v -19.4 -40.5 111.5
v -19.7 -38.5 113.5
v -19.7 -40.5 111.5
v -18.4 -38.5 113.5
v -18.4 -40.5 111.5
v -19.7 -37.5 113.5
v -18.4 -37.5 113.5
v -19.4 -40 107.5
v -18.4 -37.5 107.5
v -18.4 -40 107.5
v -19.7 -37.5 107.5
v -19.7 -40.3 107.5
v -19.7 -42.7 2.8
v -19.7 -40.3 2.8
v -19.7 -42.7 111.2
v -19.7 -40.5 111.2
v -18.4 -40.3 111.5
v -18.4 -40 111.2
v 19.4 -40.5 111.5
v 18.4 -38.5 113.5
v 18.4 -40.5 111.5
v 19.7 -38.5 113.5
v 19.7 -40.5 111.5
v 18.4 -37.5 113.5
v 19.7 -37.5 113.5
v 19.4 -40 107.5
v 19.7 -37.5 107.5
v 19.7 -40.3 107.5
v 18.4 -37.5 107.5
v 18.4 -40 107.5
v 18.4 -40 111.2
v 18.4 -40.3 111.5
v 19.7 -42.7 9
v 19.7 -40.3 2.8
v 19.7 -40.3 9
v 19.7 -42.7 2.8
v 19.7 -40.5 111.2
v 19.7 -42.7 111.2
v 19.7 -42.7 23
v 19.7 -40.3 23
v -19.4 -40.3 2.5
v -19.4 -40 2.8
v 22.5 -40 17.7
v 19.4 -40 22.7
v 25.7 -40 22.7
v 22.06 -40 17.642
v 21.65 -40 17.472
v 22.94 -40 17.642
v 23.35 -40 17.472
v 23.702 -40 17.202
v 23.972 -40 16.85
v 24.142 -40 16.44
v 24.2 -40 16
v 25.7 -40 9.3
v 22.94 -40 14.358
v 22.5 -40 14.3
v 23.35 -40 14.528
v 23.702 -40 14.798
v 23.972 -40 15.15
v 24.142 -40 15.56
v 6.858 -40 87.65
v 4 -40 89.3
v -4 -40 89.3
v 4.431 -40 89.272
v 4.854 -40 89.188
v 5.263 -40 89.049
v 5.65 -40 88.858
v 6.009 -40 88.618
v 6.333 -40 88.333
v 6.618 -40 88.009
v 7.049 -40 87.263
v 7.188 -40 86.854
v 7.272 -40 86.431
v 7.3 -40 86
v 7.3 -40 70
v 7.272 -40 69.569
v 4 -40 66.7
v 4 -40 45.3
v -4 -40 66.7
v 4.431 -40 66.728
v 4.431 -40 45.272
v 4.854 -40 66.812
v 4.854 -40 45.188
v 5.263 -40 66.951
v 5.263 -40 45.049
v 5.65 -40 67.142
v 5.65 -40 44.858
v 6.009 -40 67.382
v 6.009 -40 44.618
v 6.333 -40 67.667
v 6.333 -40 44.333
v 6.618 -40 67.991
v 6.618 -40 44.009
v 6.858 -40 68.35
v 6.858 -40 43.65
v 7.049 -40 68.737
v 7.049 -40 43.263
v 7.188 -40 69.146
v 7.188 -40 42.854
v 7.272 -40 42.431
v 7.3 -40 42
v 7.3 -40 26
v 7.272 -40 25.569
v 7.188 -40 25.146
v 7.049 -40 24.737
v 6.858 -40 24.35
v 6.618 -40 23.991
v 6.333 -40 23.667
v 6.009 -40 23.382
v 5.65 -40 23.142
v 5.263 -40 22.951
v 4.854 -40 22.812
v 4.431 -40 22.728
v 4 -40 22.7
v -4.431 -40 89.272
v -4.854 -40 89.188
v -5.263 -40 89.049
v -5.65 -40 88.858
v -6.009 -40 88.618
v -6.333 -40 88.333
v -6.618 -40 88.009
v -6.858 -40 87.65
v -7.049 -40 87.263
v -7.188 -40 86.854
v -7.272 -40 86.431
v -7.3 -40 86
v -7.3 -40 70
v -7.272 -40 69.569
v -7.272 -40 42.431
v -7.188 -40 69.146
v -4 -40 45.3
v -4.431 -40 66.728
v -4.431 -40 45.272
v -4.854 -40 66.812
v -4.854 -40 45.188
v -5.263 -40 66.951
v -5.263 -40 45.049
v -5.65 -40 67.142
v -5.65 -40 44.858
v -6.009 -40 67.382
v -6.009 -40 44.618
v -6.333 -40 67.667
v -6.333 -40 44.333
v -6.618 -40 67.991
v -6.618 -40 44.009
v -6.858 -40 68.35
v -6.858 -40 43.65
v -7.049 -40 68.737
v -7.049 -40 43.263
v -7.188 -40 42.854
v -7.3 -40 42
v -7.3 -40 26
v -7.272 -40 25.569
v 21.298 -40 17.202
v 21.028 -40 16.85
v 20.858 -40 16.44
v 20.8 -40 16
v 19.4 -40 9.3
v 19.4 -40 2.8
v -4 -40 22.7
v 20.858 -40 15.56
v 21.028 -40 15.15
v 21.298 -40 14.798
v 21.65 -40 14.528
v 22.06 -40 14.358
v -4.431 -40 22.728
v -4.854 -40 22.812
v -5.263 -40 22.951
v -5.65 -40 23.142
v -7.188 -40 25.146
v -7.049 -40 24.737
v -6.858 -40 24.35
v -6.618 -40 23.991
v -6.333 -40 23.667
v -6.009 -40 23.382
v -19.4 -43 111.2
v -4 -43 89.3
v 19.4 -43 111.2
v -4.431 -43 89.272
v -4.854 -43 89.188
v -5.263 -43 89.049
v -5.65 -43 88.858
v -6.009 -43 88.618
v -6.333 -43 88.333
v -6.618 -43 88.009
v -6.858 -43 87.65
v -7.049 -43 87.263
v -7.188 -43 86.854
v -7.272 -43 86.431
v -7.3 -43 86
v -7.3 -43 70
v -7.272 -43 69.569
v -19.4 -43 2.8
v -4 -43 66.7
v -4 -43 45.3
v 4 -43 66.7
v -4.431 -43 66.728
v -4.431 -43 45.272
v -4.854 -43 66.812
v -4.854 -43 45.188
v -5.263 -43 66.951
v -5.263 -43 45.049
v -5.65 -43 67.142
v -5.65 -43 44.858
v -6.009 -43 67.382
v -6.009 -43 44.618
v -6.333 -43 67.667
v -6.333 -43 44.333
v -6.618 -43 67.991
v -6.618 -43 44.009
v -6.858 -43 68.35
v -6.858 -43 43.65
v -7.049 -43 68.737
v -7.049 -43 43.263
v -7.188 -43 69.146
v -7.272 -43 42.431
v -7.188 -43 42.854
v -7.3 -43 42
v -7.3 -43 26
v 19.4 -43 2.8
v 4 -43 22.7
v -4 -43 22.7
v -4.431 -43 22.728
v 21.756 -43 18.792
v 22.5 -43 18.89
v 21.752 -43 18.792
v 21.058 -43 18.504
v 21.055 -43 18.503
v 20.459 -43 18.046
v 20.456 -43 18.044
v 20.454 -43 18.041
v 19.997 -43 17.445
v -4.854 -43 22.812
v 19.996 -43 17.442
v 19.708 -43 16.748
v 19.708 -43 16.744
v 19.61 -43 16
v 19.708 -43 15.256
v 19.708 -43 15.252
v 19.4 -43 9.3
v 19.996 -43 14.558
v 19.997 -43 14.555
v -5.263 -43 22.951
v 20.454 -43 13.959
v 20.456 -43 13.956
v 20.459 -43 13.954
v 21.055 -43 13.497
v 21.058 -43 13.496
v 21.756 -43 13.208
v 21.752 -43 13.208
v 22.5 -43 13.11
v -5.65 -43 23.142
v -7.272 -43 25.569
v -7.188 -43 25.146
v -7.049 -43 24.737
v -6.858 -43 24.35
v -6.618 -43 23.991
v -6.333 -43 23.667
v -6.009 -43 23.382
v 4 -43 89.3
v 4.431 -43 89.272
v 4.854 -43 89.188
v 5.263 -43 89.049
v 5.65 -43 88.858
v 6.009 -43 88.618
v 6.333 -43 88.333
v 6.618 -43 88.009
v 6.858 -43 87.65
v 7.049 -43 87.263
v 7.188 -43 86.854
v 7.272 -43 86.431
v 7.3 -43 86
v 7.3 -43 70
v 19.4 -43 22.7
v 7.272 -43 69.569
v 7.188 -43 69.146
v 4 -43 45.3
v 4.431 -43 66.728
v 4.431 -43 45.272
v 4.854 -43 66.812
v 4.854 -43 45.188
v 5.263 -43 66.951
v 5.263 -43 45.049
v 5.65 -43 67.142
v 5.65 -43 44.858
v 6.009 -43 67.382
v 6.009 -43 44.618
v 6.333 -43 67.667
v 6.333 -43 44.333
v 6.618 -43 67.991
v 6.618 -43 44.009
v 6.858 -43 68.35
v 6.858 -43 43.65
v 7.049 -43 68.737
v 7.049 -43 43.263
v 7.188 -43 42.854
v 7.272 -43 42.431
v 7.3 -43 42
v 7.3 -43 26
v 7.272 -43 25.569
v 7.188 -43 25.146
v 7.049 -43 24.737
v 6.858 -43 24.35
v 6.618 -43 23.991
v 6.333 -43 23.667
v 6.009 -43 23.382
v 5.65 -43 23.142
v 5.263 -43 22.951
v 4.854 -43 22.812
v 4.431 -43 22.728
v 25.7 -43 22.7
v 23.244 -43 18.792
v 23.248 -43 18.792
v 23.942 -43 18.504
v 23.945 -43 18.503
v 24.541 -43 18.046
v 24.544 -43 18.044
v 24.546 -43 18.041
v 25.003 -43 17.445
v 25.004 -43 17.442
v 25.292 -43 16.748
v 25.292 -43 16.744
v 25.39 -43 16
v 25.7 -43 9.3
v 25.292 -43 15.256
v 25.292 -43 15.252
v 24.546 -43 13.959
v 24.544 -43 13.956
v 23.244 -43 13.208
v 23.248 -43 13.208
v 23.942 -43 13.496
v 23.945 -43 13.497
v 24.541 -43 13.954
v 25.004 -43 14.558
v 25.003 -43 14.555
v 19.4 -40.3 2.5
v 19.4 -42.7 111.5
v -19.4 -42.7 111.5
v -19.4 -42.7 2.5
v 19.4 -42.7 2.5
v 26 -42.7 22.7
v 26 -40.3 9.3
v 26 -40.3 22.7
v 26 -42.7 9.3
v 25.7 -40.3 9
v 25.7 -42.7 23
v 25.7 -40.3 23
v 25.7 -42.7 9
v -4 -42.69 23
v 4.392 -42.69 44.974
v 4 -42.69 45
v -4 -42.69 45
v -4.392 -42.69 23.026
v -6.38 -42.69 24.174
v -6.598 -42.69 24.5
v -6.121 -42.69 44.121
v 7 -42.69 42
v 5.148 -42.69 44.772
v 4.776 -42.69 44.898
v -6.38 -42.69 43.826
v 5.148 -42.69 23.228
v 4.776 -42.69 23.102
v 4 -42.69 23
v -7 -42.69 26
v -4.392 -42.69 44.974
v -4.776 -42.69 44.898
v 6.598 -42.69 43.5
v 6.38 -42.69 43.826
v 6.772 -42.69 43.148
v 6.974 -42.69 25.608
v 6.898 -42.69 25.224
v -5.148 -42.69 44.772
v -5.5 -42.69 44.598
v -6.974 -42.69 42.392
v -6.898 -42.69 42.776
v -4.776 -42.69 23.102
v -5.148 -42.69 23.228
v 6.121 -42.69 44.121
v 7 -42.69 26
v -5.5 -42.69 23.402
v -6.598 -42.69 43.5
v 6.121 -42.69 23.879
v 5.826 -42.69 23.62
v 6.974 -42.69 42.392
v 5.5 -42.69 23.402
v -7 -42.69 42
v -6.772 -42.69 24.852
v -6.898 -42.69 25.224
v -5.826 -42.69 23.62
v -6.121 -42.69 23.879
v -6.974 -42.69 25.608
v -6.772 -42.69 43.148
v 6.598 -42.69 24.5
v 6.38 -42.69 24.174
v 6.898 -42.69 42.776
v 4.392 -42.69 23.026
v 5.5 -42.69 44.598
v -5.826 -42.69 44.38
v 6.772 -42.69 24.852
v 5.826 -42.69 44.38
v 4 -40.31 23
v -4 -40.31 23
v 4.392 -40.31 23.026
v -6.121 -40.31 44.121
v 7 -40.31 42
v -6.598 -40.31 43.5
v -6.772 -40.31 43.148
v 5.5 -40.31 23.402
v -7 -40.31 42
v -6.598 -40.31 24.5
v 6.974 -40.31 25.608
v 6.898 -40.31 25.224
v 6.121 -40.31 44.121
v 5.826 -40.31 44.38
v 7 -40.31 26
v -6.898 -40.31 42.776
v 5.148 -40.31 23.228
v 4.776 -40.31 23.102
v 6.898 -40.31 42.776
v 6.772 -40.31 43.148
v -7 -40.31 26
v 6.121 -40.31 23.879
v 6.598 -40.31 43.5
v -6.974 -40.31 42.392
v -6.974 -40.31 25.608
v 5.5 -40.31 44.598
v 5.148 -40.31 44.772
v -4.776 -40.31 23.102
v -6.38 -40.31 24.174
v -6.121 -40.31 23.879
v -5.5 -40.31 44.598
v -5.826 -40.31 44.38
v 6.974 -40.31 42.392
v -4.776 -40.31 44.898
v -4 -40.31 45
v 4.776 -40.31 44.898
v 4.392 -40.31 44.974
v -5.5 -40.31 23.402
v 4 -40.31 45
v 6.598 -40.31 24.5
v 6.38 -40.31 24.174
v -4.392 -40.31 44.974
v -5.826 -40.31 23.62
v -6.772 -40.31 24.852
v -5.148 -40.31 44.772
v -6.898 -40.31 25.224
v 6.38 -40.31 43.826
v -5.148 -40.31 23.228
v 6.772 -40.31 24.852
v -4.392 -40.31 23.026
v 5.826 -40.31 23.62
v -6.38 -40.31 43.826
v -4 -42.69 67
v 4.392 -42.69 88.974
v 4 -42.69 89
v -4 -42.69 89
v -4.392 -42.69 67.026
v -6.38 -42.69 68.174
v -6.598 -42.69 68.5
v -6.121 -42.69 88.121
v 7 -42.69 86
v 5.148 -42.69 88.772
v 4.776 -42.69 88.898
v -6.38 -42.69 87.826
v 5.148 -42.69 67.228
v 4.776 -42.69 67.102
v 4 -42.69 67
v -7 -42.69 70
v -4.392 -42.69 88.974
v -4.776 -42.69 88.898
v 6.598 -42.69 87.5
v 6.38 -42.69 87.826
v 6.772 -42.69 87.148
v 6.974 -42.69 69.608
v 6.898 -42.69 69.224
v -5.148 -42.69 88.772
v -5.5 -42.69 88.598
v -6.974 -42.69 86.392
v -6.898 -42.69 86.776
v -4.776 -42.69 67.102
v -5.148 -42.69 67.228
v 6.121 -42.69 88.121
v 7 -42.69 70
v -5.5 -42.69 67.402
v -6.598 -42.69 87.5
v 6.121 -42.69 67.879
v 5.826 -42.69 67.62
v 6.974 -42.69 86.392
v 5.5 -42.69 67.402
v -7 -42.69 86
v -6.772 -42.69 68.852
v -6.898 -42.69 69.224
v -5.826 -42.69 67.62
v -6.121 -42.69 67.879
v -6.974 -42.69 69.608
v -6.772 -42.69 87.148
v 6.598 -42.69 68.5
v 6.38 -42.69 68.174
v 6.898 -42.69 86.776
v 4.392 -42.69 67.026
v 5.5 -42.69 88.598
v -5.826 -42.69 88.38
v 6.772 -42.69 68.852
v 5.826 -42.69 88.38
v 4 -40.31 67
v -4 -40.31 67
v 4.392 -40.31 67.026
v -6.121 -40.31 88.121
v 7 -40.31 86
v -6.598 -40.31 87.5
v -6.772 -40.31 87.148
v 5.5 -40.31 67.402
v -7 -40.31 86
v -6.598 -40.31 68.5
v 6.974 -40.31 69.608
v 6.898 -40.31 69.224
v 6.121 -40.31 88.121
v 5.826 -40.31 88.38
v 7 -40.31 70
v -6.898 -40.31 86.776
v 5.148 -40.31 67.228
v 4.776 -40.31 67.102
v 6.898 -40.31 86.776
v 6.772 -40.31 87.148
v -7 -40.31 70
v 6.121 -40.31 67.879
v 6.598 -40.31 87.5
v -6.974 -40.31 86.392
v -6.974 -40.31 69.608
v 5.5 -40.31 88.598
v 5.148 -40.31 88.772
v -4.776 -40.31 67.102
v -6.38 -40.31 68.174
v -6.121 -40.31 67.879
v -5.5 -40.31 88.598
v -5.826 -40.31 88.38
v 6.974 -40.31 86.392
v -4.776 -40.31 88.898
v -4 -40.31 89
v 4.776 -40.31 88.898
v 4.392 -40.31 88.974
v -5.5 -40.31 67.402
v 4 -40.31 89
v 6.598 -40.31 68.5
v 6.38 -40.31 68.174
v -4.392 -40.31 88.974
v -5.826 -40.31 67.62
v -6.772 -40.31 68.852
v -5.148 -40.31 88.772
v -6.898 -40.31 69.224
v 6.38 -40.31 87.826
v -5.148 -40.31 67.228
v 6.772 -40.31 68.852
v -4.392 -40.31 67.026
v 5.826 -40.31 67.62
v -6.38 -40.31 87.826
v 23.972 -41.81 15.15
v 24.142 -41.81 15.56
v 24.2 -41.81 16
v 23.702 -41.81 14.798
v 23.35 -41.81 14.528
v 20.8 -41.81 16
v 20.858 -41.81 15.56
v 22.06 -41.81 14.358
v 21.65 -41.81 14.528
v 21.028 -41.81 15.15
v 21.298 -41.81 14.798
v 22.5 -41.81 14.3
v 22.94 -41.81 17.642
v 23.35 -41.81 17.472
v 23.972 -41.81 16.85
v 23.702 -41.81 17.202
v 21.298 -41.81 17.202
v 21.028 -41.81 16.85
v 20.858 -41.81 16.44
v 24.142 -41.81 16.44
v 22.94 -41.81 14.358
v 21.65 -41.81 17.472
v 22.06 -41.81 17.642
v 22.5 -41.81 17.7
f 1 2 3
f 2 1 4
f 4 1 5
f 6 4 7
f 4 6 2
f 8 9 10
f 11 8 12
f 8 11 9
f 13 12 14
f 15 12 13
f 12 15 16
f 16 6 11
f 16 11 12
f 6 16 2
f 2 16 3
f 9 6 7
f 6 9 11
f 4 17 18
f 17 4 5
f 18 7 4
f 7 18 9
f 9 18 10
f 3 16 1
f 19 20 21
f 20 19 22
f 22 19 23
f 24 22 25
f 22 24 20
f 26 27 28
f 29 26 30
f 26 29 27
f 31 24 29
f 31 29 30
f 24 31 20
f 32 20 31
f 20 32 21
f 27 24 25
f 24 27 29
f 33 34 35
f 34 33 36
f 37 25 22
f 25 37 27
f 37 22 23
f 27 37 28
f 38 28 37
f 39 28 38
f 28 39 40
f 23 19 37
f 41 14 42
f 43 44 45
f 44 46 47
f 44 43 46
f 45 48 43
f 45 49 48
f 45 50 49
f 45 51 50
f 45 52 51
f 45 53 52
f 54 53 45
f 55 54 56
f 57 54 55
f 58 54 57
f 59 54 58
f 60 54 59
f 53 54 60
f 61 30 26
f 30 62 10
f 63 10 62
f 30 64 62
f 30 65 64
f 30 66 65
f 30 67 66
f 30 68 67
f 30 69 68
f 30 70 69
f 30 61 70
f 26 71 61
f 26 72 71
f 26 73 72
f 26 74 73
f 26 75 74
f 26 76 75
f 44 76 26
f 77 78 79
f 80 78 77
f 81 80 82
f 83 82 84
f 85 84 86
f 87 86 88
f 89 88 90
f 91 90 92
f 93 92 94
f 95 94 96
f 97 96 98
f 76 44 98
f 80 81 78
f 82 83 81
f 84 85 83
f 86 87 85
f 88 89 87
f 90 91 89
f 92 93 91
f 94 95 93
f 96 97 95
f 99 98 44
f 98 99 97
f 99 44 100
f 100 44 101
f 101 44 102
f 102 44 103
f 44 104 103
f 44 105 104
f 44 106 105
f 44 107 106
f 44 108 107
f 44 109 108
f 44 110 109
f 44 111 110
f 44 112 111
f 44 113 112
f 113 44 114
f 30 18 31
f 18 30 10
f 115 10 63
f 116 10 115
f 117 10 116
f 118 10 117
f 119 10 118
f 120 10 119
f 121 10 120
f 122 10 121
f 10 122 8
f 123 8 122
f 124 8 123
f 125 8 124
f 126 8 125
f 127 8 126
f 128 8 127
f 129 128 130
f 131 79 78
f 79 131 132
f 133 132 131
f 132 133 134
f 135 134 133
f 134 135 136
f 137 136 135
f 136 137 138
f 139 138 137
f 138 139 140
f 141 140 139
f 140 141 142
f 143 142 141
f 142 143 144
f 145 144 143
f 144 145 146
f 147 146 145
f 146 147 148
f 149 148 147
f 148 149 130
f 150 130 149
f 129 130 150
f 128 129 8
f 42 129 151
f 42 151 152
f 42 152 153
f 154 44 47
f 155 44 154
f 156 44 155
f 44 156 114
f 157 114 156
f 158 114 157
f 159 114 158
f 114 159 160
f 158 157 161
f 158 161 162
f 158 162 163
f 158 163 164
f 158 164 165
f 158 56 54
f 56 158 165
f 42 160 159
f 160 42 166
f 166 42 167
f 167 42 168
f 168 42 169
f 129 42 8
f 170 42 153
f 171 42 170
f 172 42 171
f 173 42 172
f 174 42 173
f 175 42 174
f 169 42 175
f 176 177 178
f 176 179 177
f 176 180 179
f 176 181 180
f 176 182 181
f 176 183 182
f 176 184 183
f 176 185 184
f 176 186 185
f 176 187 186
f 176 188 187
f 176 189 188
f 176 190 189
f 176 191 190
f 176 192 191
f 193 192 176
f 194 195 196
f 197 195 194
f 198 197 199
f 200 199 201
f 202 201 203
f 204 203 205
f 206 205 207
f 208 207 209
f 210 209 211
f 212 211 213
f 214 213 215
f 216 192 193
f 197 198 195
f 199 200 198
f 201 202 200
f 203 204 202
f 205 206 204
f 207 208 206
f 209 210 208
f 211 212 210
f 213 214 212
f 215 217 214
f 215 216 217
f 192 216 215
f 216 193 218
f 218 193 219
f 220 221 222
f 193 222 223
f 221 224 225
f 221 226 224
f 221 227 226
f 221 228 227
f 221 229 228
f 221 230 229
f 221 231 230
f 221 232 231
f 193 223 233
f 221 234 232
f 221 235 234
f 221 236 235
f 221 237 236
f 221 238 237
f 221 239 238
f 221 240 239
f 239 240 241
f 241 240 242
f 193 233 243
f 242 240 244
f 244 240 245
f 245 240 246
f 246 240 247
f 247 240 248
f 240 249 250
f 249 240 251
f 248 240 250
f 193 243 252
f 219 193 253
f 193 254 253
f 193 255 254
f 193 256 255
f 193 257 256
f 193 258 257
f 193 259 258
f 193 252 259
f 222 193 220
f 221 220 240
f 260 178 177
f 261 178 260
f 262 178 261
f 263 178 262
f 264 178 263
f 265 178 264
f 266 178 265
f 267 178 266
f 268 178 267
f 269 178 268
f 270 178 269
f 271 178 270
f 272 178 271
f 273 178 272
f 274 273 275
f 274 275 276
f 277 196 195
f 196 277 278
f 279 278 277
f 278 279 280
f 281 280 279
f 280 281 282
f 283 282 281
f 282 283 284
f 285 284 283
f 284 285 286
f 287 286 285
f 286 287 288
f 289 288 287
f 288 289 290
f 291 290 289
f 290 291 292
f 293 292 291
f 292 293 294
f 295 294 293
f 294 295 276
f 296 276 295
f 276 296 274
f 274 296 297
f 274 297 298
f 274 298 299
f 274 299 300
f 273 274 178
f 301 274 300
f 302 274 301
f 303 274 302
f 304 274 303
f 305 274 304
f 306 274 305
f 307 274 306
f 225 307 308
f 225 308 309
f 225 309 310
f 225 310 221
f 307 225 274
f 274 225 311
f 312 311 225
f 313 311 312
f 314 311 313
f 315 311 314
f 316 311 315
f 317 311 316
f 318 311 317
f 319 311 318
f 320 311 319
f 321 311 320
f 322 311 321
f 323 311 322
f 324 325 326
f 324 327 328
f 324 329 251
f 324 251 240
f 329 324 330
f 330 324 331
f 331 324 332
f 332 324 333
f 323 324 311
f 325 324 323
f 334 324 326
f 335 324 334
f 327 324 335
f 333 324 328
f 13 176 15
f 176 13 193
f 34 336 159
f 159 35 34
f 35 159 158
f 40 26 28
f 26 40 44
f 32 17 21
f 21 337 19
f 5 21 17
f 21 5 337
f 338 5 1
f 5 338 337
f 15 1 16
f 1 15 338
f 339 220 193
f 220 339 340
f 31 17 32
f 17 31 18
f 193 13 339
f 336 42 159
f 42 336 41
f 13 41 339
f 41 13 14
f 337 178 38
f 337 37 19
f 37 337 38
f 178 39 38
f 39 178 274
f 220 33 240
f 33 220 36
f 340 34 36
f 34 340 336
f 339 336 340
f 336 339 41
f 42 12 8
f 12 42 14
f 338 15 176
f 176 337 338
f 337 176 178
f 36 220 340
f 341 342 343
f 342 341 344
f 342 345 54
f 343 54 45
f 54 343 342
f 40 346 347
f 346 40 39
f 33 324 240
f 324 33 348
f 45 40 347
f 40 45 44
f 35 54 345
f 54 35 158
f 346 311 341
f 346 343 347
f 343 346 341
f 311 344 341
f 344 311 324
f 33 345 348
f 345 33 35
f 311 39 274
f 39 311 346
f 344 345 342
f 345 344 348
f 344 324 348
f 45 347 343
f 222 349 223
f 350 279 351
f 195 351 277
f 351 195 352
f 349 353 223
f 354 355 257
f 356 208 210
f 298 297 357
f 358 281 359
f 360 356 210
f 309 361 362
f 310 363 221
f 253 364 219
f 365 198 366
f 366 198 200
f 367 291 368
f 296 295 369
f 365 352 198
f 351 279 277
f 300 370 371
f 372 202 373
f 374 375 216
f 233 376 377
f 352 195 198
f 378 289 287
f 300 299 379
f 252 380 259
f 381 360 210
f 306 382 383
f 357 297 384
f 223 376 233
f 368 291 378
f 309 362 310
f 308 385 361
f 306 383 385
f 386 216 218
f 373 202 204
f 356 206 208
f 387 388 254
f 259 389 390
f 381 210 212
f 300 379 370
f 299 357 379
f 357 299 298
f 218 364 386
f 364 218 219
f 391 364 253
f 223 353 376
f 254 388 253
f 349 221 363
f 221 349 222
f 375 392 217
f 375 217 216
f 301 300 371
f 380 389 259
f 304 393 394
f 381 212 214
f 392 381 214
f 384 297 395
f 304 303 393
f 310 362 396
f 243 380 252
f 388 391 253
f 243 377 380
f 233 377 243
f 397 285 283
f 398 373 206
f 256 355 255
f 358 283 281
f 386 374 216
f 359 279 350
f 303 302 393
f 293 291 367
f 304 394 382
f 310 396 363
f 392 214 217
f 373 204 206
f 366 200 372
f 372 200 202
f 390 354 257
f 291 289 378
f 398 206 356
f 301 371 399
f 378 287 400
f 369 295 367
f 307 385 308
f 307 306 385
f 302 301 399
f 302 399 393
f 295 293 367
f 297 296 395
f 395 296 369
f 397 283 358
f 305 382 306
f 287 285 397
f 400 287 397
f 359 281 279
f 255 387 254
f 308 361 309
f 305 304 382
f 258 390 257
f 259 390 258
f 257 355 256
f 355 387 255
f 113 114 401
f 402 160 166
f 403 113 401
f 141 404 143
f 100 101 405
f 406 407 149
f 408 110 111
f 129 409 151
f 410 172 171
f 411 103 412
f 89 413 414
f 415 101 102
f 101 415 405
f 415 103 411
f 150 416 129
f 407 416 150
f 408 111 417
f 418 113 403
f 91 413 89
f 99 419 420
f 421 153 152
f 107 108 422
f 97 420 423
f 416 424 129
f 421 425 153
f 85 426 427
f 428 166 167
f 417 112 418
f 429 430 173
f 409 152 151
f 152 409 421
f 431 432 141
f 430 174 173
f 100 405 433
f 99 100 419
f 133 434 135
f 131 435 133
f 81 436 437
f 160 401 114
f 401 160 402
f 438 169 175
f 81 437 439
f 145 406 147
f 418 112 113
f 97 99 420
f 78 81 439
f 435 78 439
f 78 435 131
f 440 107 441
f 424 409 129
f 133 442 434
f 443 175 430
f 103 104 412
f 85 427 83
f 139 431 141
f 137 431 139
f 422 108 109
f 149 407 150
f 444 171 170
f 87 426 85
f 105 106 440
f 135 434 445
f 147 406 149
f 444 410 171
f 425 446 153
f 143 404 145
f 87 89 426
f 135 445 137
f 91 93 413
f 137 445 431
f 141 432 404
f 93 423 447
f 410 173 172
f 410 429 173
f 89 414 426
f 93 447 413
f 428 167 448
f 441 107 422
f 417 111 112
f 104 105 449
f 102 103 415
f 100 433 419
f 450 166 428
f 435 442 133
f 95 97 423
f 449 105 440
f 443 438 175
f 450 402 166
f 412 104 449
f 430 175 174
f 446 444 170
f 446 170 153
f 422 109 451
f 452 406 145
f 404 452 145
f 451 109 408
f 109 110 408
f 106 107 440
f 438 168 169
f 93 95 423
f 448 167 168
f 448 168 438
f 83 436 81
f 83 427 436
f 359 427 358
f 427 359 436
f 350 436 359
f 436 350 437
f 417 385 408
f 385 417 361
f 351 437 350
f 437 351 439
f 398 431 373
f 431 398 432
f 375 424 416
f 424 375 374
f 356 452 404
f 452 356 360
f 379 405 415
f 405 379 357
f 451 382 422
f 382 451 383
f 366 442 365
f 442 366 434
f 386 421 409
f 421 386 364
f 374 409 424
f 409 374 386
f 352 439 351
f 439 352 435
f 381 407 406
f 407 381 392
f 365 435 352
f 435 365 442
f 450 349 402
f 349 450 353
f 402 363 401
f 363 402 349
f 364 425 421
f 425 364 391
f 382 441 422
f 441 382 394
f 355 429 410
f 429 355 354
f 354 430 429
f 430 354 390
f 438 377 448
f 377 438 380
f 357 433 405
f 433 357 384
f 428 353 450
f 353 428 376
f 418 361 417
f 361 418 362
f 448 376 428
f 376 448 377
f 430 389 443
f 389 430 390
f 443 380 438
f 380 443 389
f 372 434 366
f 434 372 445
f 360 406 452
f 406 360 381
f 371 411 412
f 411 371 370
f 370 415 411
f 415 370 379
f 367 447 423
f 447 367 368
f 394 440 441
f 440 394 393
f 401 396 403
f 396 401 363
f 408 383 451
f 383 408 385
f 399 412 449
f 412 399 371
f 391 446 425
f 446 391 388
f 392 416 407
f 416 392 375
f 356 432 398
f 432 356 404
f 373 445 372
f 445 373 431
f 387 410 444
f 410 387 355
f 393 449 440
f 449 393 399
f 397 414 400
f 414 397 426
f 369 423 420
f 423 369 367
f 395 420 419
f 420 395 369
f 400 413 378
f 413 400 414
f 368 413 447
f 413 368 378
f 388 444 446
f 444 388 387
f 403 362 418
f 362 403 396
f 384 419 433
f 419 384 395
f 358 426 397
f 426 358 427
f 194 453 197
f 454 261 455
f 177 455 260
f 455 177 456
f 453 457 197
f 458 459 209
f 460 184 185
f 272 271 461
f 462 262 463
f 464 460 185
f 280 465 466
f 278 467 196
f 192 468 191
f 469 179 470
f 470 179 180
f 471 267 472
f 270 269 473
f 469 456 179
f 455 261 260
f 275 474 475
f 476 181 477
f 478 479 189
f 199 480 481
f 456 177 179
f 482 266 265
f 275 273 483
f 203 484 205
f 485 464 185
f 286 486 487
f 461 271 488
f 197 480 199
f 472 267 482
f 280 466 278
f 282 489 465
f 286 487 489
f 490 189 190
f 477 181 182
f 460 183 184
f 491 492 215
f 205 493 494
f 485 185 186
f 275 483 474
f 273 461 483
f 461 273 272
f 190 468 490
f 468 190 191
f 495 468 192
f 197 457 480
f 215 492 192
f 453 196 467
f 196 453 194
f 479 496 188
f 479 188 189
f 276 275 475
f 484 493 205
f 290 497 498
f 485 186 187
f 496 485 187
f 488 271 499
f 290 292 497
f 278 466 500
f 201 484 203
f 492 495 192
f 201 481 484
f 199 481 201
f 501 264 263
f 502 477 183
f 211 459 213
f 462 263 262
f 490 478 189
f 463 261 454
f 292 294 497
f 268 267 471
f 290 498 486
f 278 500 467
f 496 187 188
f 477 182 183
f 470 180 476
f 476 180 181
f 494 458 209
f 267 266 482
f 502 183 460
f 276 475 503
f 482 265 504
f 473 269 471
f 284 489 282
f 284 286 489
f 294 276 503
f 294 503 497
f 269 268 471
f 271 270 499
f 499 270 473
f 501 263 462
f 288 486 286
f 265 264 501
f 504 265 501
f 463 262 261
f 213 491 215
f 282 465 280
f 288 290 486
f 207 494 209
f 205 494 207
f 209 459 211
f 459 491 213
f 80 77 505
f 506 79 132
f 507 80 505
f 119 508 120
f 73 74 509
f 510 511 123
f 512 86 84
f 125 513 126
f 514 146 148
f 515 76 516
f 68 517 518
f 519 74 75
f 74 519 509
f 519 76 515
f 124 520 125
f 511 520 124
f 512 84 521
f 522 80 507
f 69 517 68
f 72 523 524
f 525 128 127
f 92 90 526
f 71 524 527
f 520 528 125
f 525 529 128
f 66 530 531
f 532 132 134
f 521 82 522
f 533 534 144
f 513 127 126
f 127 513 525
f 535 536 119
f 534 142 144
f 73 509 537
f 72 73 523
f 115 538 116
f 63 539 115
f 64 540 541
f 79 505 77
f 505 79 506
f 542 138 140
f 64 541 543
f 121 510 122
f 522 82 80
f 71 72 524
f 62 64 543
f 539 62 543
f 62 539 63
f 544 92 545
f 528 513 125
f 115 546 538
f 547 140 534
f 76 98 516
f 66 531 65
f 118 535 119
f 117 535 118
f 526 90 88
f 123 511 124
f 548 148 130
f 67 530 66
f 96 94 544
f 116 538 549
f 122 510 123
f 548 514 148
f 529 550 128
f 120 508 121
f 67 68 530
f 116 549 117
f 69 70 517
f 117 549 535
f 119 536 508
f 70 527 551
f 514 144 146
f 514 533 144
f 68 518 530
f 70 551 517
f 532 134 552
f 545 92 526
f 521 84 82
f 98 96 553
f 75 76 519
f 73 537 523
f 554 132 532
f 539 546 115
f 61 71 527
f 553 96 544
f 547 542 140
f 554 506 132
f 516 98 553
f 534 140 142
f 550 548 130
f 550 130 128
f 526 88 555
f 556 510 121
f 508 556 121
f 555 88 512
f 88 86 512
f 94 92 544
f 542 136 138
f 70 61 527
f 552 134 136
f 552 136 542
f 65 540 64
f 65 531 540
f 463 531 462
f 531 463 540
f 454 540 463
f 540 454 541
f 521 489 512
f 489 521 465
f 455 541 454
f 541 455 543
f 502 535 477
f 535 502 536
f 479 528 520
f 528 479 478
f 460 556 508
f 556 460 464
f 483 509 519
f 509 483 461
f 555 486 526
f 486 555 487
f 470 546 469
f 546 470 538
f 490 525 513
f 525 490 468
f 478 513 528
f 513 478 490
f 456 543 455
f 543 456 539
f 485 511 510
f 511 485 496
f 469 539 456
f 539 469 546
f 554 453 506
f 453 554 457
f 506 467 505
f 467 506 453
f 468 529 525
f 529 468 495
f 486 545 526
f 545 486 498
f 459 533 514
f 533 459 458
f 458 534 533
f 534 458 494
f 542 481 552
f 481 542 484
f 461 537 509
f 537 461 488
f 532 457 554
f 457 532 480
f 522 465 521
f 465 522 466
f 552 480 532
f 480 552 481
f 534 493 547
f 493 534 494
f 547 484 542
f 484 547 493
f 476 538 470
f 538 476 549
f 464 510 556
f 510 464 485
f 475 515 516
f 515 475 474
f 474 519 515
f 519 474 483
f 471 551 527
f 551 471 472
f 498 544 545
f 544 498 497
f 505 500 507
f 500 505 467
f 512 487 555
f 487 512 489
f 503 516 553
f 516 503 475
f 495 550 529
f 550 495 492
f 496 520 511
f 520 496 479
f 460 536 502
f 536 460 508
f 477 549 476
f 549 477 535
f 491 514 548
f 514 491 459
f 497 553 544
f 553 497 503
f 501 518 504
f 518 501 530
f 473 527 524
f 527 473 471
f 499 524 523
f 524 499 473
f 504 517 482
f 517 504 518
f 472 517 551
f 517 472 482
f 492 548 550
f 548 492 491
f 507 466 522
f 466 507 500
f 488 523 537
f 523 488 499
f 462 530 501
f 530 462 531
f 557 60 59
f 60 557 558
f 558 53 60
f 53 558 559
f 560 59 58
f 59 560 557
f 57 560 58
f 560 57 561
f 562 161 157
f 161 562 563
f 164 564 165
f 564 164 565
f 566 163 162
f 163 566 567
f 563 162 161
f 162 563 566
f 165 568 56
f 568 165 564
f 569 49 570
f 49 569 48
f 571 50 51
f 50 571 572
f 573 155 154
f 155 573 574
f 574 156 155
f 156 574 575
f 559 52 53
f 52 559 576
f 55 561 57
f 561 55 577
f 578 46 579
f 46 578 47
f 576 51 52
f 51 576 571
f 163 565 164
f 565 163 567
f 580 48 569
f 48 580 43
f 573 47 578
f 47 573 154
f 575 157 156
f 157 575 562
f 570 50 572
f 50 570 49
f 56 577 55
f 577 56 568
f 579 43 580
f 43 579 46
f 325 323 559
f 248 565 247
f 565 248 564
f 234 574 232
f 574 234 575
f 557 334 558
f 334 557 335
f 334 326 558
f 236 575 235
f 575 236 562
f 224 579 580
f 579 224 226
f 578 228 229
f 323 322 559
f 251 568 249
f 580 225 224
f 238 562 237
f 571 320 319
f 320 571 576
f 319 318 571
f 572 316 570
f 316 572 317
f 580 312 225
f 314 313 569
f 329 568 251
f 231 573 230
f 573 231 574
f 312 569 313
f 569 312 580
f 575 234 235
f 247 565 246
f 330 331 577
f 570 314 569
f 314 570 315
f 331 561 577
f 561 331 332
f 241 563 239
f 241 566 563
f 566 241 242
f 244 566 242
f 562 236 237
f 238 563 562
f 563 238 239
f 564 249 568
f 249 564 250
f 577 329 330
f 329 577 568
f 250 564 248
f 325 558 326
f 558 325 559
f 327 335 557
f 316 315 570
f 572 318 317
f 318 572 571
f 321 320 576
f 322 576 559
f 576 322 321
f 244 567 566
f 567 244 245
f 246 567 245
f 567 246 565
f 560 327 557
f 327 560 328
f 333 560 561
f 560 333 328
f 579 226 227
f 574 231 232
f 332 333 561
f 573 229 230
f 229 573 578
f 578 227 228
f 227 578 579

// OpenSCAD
// file: ../../../../../scad/lib/child_interior_mounts.scad
// Confirmed t200 battery/deck interfaces; mm. Plain purchased M3 nut AF5.5/t2.4.
// Shared by bay, removable floor and deck. No printed threads or metal inserts.
ci_box_hx=24;
ci_box_hz=[12,90];
ci_service_x=22.5;
ci_service_z=16;
ci_clear_d=3.4;
ci_nut_af=5.7; // 0.2 mm total clearance over the existing AF5.5 nut model
ci_nut_t=2.6;
ci_ear_depth=8;
ci_ear_outer_x=27.7; // cable rail starts at X28; do not enlarge further
ci_ear_half_z=7;
ci_service_half_z=7;
ci_service_outer_x=26;
ci_service_depth=9.0;
ci_service_nut_y=-36.5;
ci_edge_chamfer=0.3;
ci_edge_fillet_r=0.6;

// Nut flats face +/-X. Axis +Y, pocket is inserted from the outward X side.
module ci_nut_y(af=ci_nut_af,depth=ci_nut_t) {
    rotate([-90,0,0]) rotate([0,0,30])
        cylinder(d=af/cos(30),h=depth,$fn=6);
}

// Rectangular block with 0.3 mm edge relief, preserving its bounding box.
// The central flat faces retain the specified mounting planes.
module ci_chamfer_box(size,c=ci_edge_chamfer) {
    assert(min(size)>2*c);
    hull() {
        translate([c,c,0]) cube([size[0]-2*c,size[1]-2*c,size[2]]);
        translate([c,0,c]) cube([size[0]-2*c,size[1],size[2]-2*c]);
        translate([0,c,c]) cube([size[0],size[1]-2*c,size[2]-2*c]);
    }
}

// Finish an individual prism, with shrink/expand compensation preserving bounds.
// Apply to structural profiles before assembly booleans, never the full model.
module ci_rounded_extrude(h,r=ci_edge_chamfer) {
    assert(h>2*r);
    translate([0,0,r]) minkowski() {
        linear_extrude(h-2*r) offset(delta=-r) children();
        // OpenSCAD's faceted sphere has flattened poles. Compensate along the
        // extrusion axis so flat flange seats remain exactly at Z0 and Zh.
        scale([1,1,1/cos(180/12)]) sphere(r=r,$fn=12);
    }
}
// main file
include <../../../../../scad/lib/child_interior_mounts.scad>
// Removable battery floor, nut-bolted service revision 2026-10-01.
// M3x8 at local X22.5/Z16 (world Z36), accessible with tube removed,
// while interior stays secured to the lower flange.
// Remove screw, slide -Z by 2 mm, then withdraw -Y.
// Lower plate edge world Z22.5 -> Z20.5 during release; flange face Z19.
// Upper retaining hooks remain outside the battery. No lower screw tab.
// Coordinates are shared with child_vtray_batt_box; origin world Z20.

/* [箱との取合い (child_vtray_batt_box と一致させること)] */
cav_x      = 20;      // 箱の内幅の半分
floor_y1   = -40;     // 板の上面 (LiPo が載る面)
floor_t    = 3;       // 板厚
cav_l      = 112;     // 端壁上面 (z=0) からリップまで
lip_t      = 1.5;     // リップの厚み (Z)
end_t      = 6;       // −Z 端壁の厚み (板のタブはこの下に入る)
slot_x0    = 10.5;    // 端壁の柱の半幅 (タブはこれより狭く)
side_clear = 0.3;     // 板と壁の片側クリアランス
end_clear  = 0.5;     // 板の +Z 端とリップのすきま

/* [フック (+Z 端)] */
hook_w     = 1.3;     // 厚み (X)。箱の hook_w と一致
hook_h     = 3;       // 高さ (Y): 板上面の 0.5mm 下から 2.5mm 上まで
hook_l     = 2;       // リップのスロットへの差し込み長 (Z) = リップ厚 + 0.5
hook_base  = 4;       // 板の上に載る根元の長さ (Z)

/* [−Z タブと皿ねじ] */
tab_x      = 7;       // タブの半幅 (柱の半幅より狭く。貫通口 r43.75 の中: rad(7,-43)=43.6)
tab_t      = 3;       // タブの厚み (板と面一 → 寝かせて印刷してもサポート不要)
service_x = ci_service_x;
service_r = 2.8;
plate_z0 = 2.5; // lower edge stays above flange after the 2 mm release slide
screw_d    = 3.4;     // M3 バカ穴
csk_d      = 5.8;     // 皿頭の座ぐり径 (JIS M3 頭 5.5 + 0.3)
service_z = ci_service_z;
screw_z    = service_z;      // local coordinate, world Z36

/* [軽量化・確認窓] */
win_z      = [34, 78];
win_l      = 22;
win_w      = 14;
window_corner_r = 3; // Spread load around the viewing windows.
window_edge_chamfer = 0.3; // Both faces; lower rim grows at 45 degrees.

$fn = 48;

// ---- 導出 -------------------------------------------------------------
plate_x  = cav_x - side_clear;        // 18.7
plate_z1 = cav_l - end_clear;         // 111.5
floor_y0 = floor_y1 - floor_t;        // -43
hook_y0  = floor_y1 - 0.5;            // -40.5
hook_x0  = plate_x - hook_w;          // 17.3

// ---- 成立性チェック ---------------------------------------------------
assert(tab_x < slot_x0 - 0.2, "タブが柱より広い");
assert(csk_d/2 + 1 < tab_x, "皿座ぐりがタブの縁に近すぎる");
assert((csk_d - screw_d)/2 <= tab_t - 0.5, "皿座ぐりがタブを突き抜ける");
assert(sqrt(tab_x*tab_x + (floor_y1 - tab_t)*(floor_y1 - tab_t)) <= 43.75, "タブが下フランジ貫通口 (r43.75) に入らない");
assert(20 + plate_z0 - hook_l > 19 + 1, "Release slide crosses flange face");
assert(hook_l <= lip_t + 0.5 + 0.01, "フックがリップを突き抜ける");
assert(plate_z1 + hook_l <= cav_l + lip_t, "フックがリップの外へ出る");
for (z = win_z) {
    assert(z - win_l/2 > 3 && z + win_l/2 < plate_z1 - 3, str("窓 (Z=", z, ") が板の端にかかる"));
    assert(win_w/2 < plate_x - 3, "窓が板の縁にかかる");
}

// ---- 本体 -------------------------------------------------------------
difference() {
    union() {
        // 板 (箱の壁の間)
        translate([-plate_x, floor_y0, plate_z0]) ci_chamfer_box([2*plate_x, floor_t, plate_z1-plate_z0]);
        // 14 mm long tab spreads nut preload into the floor; no small round ear.
        translate([16,floor_y0,screw_z-ci_service_half_z])
            ci_chamfer_box([ci_service_outer_x-16,floor_t,2*ci_service_half_z]);
        // +Z フック ×2 (板の上に根元を載せ、リップのスロットへ hook_l 突き出す)
        for (sx = [-1, 1])
            translate([sx > 0 ? hook_x0 : -plate_x,0,0])
                rotate([90,0,90]) linear_extrude(hook_w)
                    polygon([[hook_y0,plate_z1-hook_base],[hook_y0,plate_z1],
                             [hook_y0+hook_l,plate_z1+hook_l],
                             [hook_y0+hook_h,plate_z1+hook_l],
                             [hook_y0+hook_h,plate_z1-hook_base]]);
    }
    // 皿ねじ: バカ穴 + 90° 座ぐり (板の下面側)
    translate([service_x, floor_y1 - tab_t - 0.5, screw_z]) rotate([-90, 0, 0]) cylinder(d = screw_d, h = tab_t + 1, $fn = 24);
    translate([service_x, floor_y1 - tab_t - 0.01, screw_z]) rotate([-90, 0, 0])
        cylinder(d1 = csk_d, d2 = screw_d, h = (csk_d - screw_d)/2, $fn = 24);
    // Smaller rounded windows leave 12.7 mm side bands instead of 9.7 mm.
    for (z = win_z)
        translate([0,floor_y0,z]) rotate([-90,0,0]) window_cut();
}

module window_profile(extra=0) {
    offset(r=window_corner_r+extra,$fn=48)
        square([win_w-2*window_corner_r,win_l-2*window_corner_r],center=true);
}
module window_cut() {
    assert(window_corner_r>0 && 2*window_corner_r<min(win_w,win_l));
    assert(window_edge_chamfer>0 && 2*window_edge_chamfer<floor_t);
    translate([0,0,-0.01]) linear_extrude(floor_t+0.02) window_profile();
    for (top=[false,true]) translate([0,0,top ? floor_t : 0])
        scale([1,1,top ? -1 : 1]) hull() {
            translate([0,0,-0.01]) linear_extrude(0.01) window_profile(window_edge_chamfer);
            translate([0,0,window_edge_chamfer]) linear_extrude(0.01) window_profile();
        }
}

echo(str("child_vtray_batt_floor: ", 2*plate_x, " x ", floor_t, " x ", plate_z1,
         " (+ タブ z ", -end_t, "..0, フック +", hook_l, ")  皿ねじ M3 @ z ", screw_z));
